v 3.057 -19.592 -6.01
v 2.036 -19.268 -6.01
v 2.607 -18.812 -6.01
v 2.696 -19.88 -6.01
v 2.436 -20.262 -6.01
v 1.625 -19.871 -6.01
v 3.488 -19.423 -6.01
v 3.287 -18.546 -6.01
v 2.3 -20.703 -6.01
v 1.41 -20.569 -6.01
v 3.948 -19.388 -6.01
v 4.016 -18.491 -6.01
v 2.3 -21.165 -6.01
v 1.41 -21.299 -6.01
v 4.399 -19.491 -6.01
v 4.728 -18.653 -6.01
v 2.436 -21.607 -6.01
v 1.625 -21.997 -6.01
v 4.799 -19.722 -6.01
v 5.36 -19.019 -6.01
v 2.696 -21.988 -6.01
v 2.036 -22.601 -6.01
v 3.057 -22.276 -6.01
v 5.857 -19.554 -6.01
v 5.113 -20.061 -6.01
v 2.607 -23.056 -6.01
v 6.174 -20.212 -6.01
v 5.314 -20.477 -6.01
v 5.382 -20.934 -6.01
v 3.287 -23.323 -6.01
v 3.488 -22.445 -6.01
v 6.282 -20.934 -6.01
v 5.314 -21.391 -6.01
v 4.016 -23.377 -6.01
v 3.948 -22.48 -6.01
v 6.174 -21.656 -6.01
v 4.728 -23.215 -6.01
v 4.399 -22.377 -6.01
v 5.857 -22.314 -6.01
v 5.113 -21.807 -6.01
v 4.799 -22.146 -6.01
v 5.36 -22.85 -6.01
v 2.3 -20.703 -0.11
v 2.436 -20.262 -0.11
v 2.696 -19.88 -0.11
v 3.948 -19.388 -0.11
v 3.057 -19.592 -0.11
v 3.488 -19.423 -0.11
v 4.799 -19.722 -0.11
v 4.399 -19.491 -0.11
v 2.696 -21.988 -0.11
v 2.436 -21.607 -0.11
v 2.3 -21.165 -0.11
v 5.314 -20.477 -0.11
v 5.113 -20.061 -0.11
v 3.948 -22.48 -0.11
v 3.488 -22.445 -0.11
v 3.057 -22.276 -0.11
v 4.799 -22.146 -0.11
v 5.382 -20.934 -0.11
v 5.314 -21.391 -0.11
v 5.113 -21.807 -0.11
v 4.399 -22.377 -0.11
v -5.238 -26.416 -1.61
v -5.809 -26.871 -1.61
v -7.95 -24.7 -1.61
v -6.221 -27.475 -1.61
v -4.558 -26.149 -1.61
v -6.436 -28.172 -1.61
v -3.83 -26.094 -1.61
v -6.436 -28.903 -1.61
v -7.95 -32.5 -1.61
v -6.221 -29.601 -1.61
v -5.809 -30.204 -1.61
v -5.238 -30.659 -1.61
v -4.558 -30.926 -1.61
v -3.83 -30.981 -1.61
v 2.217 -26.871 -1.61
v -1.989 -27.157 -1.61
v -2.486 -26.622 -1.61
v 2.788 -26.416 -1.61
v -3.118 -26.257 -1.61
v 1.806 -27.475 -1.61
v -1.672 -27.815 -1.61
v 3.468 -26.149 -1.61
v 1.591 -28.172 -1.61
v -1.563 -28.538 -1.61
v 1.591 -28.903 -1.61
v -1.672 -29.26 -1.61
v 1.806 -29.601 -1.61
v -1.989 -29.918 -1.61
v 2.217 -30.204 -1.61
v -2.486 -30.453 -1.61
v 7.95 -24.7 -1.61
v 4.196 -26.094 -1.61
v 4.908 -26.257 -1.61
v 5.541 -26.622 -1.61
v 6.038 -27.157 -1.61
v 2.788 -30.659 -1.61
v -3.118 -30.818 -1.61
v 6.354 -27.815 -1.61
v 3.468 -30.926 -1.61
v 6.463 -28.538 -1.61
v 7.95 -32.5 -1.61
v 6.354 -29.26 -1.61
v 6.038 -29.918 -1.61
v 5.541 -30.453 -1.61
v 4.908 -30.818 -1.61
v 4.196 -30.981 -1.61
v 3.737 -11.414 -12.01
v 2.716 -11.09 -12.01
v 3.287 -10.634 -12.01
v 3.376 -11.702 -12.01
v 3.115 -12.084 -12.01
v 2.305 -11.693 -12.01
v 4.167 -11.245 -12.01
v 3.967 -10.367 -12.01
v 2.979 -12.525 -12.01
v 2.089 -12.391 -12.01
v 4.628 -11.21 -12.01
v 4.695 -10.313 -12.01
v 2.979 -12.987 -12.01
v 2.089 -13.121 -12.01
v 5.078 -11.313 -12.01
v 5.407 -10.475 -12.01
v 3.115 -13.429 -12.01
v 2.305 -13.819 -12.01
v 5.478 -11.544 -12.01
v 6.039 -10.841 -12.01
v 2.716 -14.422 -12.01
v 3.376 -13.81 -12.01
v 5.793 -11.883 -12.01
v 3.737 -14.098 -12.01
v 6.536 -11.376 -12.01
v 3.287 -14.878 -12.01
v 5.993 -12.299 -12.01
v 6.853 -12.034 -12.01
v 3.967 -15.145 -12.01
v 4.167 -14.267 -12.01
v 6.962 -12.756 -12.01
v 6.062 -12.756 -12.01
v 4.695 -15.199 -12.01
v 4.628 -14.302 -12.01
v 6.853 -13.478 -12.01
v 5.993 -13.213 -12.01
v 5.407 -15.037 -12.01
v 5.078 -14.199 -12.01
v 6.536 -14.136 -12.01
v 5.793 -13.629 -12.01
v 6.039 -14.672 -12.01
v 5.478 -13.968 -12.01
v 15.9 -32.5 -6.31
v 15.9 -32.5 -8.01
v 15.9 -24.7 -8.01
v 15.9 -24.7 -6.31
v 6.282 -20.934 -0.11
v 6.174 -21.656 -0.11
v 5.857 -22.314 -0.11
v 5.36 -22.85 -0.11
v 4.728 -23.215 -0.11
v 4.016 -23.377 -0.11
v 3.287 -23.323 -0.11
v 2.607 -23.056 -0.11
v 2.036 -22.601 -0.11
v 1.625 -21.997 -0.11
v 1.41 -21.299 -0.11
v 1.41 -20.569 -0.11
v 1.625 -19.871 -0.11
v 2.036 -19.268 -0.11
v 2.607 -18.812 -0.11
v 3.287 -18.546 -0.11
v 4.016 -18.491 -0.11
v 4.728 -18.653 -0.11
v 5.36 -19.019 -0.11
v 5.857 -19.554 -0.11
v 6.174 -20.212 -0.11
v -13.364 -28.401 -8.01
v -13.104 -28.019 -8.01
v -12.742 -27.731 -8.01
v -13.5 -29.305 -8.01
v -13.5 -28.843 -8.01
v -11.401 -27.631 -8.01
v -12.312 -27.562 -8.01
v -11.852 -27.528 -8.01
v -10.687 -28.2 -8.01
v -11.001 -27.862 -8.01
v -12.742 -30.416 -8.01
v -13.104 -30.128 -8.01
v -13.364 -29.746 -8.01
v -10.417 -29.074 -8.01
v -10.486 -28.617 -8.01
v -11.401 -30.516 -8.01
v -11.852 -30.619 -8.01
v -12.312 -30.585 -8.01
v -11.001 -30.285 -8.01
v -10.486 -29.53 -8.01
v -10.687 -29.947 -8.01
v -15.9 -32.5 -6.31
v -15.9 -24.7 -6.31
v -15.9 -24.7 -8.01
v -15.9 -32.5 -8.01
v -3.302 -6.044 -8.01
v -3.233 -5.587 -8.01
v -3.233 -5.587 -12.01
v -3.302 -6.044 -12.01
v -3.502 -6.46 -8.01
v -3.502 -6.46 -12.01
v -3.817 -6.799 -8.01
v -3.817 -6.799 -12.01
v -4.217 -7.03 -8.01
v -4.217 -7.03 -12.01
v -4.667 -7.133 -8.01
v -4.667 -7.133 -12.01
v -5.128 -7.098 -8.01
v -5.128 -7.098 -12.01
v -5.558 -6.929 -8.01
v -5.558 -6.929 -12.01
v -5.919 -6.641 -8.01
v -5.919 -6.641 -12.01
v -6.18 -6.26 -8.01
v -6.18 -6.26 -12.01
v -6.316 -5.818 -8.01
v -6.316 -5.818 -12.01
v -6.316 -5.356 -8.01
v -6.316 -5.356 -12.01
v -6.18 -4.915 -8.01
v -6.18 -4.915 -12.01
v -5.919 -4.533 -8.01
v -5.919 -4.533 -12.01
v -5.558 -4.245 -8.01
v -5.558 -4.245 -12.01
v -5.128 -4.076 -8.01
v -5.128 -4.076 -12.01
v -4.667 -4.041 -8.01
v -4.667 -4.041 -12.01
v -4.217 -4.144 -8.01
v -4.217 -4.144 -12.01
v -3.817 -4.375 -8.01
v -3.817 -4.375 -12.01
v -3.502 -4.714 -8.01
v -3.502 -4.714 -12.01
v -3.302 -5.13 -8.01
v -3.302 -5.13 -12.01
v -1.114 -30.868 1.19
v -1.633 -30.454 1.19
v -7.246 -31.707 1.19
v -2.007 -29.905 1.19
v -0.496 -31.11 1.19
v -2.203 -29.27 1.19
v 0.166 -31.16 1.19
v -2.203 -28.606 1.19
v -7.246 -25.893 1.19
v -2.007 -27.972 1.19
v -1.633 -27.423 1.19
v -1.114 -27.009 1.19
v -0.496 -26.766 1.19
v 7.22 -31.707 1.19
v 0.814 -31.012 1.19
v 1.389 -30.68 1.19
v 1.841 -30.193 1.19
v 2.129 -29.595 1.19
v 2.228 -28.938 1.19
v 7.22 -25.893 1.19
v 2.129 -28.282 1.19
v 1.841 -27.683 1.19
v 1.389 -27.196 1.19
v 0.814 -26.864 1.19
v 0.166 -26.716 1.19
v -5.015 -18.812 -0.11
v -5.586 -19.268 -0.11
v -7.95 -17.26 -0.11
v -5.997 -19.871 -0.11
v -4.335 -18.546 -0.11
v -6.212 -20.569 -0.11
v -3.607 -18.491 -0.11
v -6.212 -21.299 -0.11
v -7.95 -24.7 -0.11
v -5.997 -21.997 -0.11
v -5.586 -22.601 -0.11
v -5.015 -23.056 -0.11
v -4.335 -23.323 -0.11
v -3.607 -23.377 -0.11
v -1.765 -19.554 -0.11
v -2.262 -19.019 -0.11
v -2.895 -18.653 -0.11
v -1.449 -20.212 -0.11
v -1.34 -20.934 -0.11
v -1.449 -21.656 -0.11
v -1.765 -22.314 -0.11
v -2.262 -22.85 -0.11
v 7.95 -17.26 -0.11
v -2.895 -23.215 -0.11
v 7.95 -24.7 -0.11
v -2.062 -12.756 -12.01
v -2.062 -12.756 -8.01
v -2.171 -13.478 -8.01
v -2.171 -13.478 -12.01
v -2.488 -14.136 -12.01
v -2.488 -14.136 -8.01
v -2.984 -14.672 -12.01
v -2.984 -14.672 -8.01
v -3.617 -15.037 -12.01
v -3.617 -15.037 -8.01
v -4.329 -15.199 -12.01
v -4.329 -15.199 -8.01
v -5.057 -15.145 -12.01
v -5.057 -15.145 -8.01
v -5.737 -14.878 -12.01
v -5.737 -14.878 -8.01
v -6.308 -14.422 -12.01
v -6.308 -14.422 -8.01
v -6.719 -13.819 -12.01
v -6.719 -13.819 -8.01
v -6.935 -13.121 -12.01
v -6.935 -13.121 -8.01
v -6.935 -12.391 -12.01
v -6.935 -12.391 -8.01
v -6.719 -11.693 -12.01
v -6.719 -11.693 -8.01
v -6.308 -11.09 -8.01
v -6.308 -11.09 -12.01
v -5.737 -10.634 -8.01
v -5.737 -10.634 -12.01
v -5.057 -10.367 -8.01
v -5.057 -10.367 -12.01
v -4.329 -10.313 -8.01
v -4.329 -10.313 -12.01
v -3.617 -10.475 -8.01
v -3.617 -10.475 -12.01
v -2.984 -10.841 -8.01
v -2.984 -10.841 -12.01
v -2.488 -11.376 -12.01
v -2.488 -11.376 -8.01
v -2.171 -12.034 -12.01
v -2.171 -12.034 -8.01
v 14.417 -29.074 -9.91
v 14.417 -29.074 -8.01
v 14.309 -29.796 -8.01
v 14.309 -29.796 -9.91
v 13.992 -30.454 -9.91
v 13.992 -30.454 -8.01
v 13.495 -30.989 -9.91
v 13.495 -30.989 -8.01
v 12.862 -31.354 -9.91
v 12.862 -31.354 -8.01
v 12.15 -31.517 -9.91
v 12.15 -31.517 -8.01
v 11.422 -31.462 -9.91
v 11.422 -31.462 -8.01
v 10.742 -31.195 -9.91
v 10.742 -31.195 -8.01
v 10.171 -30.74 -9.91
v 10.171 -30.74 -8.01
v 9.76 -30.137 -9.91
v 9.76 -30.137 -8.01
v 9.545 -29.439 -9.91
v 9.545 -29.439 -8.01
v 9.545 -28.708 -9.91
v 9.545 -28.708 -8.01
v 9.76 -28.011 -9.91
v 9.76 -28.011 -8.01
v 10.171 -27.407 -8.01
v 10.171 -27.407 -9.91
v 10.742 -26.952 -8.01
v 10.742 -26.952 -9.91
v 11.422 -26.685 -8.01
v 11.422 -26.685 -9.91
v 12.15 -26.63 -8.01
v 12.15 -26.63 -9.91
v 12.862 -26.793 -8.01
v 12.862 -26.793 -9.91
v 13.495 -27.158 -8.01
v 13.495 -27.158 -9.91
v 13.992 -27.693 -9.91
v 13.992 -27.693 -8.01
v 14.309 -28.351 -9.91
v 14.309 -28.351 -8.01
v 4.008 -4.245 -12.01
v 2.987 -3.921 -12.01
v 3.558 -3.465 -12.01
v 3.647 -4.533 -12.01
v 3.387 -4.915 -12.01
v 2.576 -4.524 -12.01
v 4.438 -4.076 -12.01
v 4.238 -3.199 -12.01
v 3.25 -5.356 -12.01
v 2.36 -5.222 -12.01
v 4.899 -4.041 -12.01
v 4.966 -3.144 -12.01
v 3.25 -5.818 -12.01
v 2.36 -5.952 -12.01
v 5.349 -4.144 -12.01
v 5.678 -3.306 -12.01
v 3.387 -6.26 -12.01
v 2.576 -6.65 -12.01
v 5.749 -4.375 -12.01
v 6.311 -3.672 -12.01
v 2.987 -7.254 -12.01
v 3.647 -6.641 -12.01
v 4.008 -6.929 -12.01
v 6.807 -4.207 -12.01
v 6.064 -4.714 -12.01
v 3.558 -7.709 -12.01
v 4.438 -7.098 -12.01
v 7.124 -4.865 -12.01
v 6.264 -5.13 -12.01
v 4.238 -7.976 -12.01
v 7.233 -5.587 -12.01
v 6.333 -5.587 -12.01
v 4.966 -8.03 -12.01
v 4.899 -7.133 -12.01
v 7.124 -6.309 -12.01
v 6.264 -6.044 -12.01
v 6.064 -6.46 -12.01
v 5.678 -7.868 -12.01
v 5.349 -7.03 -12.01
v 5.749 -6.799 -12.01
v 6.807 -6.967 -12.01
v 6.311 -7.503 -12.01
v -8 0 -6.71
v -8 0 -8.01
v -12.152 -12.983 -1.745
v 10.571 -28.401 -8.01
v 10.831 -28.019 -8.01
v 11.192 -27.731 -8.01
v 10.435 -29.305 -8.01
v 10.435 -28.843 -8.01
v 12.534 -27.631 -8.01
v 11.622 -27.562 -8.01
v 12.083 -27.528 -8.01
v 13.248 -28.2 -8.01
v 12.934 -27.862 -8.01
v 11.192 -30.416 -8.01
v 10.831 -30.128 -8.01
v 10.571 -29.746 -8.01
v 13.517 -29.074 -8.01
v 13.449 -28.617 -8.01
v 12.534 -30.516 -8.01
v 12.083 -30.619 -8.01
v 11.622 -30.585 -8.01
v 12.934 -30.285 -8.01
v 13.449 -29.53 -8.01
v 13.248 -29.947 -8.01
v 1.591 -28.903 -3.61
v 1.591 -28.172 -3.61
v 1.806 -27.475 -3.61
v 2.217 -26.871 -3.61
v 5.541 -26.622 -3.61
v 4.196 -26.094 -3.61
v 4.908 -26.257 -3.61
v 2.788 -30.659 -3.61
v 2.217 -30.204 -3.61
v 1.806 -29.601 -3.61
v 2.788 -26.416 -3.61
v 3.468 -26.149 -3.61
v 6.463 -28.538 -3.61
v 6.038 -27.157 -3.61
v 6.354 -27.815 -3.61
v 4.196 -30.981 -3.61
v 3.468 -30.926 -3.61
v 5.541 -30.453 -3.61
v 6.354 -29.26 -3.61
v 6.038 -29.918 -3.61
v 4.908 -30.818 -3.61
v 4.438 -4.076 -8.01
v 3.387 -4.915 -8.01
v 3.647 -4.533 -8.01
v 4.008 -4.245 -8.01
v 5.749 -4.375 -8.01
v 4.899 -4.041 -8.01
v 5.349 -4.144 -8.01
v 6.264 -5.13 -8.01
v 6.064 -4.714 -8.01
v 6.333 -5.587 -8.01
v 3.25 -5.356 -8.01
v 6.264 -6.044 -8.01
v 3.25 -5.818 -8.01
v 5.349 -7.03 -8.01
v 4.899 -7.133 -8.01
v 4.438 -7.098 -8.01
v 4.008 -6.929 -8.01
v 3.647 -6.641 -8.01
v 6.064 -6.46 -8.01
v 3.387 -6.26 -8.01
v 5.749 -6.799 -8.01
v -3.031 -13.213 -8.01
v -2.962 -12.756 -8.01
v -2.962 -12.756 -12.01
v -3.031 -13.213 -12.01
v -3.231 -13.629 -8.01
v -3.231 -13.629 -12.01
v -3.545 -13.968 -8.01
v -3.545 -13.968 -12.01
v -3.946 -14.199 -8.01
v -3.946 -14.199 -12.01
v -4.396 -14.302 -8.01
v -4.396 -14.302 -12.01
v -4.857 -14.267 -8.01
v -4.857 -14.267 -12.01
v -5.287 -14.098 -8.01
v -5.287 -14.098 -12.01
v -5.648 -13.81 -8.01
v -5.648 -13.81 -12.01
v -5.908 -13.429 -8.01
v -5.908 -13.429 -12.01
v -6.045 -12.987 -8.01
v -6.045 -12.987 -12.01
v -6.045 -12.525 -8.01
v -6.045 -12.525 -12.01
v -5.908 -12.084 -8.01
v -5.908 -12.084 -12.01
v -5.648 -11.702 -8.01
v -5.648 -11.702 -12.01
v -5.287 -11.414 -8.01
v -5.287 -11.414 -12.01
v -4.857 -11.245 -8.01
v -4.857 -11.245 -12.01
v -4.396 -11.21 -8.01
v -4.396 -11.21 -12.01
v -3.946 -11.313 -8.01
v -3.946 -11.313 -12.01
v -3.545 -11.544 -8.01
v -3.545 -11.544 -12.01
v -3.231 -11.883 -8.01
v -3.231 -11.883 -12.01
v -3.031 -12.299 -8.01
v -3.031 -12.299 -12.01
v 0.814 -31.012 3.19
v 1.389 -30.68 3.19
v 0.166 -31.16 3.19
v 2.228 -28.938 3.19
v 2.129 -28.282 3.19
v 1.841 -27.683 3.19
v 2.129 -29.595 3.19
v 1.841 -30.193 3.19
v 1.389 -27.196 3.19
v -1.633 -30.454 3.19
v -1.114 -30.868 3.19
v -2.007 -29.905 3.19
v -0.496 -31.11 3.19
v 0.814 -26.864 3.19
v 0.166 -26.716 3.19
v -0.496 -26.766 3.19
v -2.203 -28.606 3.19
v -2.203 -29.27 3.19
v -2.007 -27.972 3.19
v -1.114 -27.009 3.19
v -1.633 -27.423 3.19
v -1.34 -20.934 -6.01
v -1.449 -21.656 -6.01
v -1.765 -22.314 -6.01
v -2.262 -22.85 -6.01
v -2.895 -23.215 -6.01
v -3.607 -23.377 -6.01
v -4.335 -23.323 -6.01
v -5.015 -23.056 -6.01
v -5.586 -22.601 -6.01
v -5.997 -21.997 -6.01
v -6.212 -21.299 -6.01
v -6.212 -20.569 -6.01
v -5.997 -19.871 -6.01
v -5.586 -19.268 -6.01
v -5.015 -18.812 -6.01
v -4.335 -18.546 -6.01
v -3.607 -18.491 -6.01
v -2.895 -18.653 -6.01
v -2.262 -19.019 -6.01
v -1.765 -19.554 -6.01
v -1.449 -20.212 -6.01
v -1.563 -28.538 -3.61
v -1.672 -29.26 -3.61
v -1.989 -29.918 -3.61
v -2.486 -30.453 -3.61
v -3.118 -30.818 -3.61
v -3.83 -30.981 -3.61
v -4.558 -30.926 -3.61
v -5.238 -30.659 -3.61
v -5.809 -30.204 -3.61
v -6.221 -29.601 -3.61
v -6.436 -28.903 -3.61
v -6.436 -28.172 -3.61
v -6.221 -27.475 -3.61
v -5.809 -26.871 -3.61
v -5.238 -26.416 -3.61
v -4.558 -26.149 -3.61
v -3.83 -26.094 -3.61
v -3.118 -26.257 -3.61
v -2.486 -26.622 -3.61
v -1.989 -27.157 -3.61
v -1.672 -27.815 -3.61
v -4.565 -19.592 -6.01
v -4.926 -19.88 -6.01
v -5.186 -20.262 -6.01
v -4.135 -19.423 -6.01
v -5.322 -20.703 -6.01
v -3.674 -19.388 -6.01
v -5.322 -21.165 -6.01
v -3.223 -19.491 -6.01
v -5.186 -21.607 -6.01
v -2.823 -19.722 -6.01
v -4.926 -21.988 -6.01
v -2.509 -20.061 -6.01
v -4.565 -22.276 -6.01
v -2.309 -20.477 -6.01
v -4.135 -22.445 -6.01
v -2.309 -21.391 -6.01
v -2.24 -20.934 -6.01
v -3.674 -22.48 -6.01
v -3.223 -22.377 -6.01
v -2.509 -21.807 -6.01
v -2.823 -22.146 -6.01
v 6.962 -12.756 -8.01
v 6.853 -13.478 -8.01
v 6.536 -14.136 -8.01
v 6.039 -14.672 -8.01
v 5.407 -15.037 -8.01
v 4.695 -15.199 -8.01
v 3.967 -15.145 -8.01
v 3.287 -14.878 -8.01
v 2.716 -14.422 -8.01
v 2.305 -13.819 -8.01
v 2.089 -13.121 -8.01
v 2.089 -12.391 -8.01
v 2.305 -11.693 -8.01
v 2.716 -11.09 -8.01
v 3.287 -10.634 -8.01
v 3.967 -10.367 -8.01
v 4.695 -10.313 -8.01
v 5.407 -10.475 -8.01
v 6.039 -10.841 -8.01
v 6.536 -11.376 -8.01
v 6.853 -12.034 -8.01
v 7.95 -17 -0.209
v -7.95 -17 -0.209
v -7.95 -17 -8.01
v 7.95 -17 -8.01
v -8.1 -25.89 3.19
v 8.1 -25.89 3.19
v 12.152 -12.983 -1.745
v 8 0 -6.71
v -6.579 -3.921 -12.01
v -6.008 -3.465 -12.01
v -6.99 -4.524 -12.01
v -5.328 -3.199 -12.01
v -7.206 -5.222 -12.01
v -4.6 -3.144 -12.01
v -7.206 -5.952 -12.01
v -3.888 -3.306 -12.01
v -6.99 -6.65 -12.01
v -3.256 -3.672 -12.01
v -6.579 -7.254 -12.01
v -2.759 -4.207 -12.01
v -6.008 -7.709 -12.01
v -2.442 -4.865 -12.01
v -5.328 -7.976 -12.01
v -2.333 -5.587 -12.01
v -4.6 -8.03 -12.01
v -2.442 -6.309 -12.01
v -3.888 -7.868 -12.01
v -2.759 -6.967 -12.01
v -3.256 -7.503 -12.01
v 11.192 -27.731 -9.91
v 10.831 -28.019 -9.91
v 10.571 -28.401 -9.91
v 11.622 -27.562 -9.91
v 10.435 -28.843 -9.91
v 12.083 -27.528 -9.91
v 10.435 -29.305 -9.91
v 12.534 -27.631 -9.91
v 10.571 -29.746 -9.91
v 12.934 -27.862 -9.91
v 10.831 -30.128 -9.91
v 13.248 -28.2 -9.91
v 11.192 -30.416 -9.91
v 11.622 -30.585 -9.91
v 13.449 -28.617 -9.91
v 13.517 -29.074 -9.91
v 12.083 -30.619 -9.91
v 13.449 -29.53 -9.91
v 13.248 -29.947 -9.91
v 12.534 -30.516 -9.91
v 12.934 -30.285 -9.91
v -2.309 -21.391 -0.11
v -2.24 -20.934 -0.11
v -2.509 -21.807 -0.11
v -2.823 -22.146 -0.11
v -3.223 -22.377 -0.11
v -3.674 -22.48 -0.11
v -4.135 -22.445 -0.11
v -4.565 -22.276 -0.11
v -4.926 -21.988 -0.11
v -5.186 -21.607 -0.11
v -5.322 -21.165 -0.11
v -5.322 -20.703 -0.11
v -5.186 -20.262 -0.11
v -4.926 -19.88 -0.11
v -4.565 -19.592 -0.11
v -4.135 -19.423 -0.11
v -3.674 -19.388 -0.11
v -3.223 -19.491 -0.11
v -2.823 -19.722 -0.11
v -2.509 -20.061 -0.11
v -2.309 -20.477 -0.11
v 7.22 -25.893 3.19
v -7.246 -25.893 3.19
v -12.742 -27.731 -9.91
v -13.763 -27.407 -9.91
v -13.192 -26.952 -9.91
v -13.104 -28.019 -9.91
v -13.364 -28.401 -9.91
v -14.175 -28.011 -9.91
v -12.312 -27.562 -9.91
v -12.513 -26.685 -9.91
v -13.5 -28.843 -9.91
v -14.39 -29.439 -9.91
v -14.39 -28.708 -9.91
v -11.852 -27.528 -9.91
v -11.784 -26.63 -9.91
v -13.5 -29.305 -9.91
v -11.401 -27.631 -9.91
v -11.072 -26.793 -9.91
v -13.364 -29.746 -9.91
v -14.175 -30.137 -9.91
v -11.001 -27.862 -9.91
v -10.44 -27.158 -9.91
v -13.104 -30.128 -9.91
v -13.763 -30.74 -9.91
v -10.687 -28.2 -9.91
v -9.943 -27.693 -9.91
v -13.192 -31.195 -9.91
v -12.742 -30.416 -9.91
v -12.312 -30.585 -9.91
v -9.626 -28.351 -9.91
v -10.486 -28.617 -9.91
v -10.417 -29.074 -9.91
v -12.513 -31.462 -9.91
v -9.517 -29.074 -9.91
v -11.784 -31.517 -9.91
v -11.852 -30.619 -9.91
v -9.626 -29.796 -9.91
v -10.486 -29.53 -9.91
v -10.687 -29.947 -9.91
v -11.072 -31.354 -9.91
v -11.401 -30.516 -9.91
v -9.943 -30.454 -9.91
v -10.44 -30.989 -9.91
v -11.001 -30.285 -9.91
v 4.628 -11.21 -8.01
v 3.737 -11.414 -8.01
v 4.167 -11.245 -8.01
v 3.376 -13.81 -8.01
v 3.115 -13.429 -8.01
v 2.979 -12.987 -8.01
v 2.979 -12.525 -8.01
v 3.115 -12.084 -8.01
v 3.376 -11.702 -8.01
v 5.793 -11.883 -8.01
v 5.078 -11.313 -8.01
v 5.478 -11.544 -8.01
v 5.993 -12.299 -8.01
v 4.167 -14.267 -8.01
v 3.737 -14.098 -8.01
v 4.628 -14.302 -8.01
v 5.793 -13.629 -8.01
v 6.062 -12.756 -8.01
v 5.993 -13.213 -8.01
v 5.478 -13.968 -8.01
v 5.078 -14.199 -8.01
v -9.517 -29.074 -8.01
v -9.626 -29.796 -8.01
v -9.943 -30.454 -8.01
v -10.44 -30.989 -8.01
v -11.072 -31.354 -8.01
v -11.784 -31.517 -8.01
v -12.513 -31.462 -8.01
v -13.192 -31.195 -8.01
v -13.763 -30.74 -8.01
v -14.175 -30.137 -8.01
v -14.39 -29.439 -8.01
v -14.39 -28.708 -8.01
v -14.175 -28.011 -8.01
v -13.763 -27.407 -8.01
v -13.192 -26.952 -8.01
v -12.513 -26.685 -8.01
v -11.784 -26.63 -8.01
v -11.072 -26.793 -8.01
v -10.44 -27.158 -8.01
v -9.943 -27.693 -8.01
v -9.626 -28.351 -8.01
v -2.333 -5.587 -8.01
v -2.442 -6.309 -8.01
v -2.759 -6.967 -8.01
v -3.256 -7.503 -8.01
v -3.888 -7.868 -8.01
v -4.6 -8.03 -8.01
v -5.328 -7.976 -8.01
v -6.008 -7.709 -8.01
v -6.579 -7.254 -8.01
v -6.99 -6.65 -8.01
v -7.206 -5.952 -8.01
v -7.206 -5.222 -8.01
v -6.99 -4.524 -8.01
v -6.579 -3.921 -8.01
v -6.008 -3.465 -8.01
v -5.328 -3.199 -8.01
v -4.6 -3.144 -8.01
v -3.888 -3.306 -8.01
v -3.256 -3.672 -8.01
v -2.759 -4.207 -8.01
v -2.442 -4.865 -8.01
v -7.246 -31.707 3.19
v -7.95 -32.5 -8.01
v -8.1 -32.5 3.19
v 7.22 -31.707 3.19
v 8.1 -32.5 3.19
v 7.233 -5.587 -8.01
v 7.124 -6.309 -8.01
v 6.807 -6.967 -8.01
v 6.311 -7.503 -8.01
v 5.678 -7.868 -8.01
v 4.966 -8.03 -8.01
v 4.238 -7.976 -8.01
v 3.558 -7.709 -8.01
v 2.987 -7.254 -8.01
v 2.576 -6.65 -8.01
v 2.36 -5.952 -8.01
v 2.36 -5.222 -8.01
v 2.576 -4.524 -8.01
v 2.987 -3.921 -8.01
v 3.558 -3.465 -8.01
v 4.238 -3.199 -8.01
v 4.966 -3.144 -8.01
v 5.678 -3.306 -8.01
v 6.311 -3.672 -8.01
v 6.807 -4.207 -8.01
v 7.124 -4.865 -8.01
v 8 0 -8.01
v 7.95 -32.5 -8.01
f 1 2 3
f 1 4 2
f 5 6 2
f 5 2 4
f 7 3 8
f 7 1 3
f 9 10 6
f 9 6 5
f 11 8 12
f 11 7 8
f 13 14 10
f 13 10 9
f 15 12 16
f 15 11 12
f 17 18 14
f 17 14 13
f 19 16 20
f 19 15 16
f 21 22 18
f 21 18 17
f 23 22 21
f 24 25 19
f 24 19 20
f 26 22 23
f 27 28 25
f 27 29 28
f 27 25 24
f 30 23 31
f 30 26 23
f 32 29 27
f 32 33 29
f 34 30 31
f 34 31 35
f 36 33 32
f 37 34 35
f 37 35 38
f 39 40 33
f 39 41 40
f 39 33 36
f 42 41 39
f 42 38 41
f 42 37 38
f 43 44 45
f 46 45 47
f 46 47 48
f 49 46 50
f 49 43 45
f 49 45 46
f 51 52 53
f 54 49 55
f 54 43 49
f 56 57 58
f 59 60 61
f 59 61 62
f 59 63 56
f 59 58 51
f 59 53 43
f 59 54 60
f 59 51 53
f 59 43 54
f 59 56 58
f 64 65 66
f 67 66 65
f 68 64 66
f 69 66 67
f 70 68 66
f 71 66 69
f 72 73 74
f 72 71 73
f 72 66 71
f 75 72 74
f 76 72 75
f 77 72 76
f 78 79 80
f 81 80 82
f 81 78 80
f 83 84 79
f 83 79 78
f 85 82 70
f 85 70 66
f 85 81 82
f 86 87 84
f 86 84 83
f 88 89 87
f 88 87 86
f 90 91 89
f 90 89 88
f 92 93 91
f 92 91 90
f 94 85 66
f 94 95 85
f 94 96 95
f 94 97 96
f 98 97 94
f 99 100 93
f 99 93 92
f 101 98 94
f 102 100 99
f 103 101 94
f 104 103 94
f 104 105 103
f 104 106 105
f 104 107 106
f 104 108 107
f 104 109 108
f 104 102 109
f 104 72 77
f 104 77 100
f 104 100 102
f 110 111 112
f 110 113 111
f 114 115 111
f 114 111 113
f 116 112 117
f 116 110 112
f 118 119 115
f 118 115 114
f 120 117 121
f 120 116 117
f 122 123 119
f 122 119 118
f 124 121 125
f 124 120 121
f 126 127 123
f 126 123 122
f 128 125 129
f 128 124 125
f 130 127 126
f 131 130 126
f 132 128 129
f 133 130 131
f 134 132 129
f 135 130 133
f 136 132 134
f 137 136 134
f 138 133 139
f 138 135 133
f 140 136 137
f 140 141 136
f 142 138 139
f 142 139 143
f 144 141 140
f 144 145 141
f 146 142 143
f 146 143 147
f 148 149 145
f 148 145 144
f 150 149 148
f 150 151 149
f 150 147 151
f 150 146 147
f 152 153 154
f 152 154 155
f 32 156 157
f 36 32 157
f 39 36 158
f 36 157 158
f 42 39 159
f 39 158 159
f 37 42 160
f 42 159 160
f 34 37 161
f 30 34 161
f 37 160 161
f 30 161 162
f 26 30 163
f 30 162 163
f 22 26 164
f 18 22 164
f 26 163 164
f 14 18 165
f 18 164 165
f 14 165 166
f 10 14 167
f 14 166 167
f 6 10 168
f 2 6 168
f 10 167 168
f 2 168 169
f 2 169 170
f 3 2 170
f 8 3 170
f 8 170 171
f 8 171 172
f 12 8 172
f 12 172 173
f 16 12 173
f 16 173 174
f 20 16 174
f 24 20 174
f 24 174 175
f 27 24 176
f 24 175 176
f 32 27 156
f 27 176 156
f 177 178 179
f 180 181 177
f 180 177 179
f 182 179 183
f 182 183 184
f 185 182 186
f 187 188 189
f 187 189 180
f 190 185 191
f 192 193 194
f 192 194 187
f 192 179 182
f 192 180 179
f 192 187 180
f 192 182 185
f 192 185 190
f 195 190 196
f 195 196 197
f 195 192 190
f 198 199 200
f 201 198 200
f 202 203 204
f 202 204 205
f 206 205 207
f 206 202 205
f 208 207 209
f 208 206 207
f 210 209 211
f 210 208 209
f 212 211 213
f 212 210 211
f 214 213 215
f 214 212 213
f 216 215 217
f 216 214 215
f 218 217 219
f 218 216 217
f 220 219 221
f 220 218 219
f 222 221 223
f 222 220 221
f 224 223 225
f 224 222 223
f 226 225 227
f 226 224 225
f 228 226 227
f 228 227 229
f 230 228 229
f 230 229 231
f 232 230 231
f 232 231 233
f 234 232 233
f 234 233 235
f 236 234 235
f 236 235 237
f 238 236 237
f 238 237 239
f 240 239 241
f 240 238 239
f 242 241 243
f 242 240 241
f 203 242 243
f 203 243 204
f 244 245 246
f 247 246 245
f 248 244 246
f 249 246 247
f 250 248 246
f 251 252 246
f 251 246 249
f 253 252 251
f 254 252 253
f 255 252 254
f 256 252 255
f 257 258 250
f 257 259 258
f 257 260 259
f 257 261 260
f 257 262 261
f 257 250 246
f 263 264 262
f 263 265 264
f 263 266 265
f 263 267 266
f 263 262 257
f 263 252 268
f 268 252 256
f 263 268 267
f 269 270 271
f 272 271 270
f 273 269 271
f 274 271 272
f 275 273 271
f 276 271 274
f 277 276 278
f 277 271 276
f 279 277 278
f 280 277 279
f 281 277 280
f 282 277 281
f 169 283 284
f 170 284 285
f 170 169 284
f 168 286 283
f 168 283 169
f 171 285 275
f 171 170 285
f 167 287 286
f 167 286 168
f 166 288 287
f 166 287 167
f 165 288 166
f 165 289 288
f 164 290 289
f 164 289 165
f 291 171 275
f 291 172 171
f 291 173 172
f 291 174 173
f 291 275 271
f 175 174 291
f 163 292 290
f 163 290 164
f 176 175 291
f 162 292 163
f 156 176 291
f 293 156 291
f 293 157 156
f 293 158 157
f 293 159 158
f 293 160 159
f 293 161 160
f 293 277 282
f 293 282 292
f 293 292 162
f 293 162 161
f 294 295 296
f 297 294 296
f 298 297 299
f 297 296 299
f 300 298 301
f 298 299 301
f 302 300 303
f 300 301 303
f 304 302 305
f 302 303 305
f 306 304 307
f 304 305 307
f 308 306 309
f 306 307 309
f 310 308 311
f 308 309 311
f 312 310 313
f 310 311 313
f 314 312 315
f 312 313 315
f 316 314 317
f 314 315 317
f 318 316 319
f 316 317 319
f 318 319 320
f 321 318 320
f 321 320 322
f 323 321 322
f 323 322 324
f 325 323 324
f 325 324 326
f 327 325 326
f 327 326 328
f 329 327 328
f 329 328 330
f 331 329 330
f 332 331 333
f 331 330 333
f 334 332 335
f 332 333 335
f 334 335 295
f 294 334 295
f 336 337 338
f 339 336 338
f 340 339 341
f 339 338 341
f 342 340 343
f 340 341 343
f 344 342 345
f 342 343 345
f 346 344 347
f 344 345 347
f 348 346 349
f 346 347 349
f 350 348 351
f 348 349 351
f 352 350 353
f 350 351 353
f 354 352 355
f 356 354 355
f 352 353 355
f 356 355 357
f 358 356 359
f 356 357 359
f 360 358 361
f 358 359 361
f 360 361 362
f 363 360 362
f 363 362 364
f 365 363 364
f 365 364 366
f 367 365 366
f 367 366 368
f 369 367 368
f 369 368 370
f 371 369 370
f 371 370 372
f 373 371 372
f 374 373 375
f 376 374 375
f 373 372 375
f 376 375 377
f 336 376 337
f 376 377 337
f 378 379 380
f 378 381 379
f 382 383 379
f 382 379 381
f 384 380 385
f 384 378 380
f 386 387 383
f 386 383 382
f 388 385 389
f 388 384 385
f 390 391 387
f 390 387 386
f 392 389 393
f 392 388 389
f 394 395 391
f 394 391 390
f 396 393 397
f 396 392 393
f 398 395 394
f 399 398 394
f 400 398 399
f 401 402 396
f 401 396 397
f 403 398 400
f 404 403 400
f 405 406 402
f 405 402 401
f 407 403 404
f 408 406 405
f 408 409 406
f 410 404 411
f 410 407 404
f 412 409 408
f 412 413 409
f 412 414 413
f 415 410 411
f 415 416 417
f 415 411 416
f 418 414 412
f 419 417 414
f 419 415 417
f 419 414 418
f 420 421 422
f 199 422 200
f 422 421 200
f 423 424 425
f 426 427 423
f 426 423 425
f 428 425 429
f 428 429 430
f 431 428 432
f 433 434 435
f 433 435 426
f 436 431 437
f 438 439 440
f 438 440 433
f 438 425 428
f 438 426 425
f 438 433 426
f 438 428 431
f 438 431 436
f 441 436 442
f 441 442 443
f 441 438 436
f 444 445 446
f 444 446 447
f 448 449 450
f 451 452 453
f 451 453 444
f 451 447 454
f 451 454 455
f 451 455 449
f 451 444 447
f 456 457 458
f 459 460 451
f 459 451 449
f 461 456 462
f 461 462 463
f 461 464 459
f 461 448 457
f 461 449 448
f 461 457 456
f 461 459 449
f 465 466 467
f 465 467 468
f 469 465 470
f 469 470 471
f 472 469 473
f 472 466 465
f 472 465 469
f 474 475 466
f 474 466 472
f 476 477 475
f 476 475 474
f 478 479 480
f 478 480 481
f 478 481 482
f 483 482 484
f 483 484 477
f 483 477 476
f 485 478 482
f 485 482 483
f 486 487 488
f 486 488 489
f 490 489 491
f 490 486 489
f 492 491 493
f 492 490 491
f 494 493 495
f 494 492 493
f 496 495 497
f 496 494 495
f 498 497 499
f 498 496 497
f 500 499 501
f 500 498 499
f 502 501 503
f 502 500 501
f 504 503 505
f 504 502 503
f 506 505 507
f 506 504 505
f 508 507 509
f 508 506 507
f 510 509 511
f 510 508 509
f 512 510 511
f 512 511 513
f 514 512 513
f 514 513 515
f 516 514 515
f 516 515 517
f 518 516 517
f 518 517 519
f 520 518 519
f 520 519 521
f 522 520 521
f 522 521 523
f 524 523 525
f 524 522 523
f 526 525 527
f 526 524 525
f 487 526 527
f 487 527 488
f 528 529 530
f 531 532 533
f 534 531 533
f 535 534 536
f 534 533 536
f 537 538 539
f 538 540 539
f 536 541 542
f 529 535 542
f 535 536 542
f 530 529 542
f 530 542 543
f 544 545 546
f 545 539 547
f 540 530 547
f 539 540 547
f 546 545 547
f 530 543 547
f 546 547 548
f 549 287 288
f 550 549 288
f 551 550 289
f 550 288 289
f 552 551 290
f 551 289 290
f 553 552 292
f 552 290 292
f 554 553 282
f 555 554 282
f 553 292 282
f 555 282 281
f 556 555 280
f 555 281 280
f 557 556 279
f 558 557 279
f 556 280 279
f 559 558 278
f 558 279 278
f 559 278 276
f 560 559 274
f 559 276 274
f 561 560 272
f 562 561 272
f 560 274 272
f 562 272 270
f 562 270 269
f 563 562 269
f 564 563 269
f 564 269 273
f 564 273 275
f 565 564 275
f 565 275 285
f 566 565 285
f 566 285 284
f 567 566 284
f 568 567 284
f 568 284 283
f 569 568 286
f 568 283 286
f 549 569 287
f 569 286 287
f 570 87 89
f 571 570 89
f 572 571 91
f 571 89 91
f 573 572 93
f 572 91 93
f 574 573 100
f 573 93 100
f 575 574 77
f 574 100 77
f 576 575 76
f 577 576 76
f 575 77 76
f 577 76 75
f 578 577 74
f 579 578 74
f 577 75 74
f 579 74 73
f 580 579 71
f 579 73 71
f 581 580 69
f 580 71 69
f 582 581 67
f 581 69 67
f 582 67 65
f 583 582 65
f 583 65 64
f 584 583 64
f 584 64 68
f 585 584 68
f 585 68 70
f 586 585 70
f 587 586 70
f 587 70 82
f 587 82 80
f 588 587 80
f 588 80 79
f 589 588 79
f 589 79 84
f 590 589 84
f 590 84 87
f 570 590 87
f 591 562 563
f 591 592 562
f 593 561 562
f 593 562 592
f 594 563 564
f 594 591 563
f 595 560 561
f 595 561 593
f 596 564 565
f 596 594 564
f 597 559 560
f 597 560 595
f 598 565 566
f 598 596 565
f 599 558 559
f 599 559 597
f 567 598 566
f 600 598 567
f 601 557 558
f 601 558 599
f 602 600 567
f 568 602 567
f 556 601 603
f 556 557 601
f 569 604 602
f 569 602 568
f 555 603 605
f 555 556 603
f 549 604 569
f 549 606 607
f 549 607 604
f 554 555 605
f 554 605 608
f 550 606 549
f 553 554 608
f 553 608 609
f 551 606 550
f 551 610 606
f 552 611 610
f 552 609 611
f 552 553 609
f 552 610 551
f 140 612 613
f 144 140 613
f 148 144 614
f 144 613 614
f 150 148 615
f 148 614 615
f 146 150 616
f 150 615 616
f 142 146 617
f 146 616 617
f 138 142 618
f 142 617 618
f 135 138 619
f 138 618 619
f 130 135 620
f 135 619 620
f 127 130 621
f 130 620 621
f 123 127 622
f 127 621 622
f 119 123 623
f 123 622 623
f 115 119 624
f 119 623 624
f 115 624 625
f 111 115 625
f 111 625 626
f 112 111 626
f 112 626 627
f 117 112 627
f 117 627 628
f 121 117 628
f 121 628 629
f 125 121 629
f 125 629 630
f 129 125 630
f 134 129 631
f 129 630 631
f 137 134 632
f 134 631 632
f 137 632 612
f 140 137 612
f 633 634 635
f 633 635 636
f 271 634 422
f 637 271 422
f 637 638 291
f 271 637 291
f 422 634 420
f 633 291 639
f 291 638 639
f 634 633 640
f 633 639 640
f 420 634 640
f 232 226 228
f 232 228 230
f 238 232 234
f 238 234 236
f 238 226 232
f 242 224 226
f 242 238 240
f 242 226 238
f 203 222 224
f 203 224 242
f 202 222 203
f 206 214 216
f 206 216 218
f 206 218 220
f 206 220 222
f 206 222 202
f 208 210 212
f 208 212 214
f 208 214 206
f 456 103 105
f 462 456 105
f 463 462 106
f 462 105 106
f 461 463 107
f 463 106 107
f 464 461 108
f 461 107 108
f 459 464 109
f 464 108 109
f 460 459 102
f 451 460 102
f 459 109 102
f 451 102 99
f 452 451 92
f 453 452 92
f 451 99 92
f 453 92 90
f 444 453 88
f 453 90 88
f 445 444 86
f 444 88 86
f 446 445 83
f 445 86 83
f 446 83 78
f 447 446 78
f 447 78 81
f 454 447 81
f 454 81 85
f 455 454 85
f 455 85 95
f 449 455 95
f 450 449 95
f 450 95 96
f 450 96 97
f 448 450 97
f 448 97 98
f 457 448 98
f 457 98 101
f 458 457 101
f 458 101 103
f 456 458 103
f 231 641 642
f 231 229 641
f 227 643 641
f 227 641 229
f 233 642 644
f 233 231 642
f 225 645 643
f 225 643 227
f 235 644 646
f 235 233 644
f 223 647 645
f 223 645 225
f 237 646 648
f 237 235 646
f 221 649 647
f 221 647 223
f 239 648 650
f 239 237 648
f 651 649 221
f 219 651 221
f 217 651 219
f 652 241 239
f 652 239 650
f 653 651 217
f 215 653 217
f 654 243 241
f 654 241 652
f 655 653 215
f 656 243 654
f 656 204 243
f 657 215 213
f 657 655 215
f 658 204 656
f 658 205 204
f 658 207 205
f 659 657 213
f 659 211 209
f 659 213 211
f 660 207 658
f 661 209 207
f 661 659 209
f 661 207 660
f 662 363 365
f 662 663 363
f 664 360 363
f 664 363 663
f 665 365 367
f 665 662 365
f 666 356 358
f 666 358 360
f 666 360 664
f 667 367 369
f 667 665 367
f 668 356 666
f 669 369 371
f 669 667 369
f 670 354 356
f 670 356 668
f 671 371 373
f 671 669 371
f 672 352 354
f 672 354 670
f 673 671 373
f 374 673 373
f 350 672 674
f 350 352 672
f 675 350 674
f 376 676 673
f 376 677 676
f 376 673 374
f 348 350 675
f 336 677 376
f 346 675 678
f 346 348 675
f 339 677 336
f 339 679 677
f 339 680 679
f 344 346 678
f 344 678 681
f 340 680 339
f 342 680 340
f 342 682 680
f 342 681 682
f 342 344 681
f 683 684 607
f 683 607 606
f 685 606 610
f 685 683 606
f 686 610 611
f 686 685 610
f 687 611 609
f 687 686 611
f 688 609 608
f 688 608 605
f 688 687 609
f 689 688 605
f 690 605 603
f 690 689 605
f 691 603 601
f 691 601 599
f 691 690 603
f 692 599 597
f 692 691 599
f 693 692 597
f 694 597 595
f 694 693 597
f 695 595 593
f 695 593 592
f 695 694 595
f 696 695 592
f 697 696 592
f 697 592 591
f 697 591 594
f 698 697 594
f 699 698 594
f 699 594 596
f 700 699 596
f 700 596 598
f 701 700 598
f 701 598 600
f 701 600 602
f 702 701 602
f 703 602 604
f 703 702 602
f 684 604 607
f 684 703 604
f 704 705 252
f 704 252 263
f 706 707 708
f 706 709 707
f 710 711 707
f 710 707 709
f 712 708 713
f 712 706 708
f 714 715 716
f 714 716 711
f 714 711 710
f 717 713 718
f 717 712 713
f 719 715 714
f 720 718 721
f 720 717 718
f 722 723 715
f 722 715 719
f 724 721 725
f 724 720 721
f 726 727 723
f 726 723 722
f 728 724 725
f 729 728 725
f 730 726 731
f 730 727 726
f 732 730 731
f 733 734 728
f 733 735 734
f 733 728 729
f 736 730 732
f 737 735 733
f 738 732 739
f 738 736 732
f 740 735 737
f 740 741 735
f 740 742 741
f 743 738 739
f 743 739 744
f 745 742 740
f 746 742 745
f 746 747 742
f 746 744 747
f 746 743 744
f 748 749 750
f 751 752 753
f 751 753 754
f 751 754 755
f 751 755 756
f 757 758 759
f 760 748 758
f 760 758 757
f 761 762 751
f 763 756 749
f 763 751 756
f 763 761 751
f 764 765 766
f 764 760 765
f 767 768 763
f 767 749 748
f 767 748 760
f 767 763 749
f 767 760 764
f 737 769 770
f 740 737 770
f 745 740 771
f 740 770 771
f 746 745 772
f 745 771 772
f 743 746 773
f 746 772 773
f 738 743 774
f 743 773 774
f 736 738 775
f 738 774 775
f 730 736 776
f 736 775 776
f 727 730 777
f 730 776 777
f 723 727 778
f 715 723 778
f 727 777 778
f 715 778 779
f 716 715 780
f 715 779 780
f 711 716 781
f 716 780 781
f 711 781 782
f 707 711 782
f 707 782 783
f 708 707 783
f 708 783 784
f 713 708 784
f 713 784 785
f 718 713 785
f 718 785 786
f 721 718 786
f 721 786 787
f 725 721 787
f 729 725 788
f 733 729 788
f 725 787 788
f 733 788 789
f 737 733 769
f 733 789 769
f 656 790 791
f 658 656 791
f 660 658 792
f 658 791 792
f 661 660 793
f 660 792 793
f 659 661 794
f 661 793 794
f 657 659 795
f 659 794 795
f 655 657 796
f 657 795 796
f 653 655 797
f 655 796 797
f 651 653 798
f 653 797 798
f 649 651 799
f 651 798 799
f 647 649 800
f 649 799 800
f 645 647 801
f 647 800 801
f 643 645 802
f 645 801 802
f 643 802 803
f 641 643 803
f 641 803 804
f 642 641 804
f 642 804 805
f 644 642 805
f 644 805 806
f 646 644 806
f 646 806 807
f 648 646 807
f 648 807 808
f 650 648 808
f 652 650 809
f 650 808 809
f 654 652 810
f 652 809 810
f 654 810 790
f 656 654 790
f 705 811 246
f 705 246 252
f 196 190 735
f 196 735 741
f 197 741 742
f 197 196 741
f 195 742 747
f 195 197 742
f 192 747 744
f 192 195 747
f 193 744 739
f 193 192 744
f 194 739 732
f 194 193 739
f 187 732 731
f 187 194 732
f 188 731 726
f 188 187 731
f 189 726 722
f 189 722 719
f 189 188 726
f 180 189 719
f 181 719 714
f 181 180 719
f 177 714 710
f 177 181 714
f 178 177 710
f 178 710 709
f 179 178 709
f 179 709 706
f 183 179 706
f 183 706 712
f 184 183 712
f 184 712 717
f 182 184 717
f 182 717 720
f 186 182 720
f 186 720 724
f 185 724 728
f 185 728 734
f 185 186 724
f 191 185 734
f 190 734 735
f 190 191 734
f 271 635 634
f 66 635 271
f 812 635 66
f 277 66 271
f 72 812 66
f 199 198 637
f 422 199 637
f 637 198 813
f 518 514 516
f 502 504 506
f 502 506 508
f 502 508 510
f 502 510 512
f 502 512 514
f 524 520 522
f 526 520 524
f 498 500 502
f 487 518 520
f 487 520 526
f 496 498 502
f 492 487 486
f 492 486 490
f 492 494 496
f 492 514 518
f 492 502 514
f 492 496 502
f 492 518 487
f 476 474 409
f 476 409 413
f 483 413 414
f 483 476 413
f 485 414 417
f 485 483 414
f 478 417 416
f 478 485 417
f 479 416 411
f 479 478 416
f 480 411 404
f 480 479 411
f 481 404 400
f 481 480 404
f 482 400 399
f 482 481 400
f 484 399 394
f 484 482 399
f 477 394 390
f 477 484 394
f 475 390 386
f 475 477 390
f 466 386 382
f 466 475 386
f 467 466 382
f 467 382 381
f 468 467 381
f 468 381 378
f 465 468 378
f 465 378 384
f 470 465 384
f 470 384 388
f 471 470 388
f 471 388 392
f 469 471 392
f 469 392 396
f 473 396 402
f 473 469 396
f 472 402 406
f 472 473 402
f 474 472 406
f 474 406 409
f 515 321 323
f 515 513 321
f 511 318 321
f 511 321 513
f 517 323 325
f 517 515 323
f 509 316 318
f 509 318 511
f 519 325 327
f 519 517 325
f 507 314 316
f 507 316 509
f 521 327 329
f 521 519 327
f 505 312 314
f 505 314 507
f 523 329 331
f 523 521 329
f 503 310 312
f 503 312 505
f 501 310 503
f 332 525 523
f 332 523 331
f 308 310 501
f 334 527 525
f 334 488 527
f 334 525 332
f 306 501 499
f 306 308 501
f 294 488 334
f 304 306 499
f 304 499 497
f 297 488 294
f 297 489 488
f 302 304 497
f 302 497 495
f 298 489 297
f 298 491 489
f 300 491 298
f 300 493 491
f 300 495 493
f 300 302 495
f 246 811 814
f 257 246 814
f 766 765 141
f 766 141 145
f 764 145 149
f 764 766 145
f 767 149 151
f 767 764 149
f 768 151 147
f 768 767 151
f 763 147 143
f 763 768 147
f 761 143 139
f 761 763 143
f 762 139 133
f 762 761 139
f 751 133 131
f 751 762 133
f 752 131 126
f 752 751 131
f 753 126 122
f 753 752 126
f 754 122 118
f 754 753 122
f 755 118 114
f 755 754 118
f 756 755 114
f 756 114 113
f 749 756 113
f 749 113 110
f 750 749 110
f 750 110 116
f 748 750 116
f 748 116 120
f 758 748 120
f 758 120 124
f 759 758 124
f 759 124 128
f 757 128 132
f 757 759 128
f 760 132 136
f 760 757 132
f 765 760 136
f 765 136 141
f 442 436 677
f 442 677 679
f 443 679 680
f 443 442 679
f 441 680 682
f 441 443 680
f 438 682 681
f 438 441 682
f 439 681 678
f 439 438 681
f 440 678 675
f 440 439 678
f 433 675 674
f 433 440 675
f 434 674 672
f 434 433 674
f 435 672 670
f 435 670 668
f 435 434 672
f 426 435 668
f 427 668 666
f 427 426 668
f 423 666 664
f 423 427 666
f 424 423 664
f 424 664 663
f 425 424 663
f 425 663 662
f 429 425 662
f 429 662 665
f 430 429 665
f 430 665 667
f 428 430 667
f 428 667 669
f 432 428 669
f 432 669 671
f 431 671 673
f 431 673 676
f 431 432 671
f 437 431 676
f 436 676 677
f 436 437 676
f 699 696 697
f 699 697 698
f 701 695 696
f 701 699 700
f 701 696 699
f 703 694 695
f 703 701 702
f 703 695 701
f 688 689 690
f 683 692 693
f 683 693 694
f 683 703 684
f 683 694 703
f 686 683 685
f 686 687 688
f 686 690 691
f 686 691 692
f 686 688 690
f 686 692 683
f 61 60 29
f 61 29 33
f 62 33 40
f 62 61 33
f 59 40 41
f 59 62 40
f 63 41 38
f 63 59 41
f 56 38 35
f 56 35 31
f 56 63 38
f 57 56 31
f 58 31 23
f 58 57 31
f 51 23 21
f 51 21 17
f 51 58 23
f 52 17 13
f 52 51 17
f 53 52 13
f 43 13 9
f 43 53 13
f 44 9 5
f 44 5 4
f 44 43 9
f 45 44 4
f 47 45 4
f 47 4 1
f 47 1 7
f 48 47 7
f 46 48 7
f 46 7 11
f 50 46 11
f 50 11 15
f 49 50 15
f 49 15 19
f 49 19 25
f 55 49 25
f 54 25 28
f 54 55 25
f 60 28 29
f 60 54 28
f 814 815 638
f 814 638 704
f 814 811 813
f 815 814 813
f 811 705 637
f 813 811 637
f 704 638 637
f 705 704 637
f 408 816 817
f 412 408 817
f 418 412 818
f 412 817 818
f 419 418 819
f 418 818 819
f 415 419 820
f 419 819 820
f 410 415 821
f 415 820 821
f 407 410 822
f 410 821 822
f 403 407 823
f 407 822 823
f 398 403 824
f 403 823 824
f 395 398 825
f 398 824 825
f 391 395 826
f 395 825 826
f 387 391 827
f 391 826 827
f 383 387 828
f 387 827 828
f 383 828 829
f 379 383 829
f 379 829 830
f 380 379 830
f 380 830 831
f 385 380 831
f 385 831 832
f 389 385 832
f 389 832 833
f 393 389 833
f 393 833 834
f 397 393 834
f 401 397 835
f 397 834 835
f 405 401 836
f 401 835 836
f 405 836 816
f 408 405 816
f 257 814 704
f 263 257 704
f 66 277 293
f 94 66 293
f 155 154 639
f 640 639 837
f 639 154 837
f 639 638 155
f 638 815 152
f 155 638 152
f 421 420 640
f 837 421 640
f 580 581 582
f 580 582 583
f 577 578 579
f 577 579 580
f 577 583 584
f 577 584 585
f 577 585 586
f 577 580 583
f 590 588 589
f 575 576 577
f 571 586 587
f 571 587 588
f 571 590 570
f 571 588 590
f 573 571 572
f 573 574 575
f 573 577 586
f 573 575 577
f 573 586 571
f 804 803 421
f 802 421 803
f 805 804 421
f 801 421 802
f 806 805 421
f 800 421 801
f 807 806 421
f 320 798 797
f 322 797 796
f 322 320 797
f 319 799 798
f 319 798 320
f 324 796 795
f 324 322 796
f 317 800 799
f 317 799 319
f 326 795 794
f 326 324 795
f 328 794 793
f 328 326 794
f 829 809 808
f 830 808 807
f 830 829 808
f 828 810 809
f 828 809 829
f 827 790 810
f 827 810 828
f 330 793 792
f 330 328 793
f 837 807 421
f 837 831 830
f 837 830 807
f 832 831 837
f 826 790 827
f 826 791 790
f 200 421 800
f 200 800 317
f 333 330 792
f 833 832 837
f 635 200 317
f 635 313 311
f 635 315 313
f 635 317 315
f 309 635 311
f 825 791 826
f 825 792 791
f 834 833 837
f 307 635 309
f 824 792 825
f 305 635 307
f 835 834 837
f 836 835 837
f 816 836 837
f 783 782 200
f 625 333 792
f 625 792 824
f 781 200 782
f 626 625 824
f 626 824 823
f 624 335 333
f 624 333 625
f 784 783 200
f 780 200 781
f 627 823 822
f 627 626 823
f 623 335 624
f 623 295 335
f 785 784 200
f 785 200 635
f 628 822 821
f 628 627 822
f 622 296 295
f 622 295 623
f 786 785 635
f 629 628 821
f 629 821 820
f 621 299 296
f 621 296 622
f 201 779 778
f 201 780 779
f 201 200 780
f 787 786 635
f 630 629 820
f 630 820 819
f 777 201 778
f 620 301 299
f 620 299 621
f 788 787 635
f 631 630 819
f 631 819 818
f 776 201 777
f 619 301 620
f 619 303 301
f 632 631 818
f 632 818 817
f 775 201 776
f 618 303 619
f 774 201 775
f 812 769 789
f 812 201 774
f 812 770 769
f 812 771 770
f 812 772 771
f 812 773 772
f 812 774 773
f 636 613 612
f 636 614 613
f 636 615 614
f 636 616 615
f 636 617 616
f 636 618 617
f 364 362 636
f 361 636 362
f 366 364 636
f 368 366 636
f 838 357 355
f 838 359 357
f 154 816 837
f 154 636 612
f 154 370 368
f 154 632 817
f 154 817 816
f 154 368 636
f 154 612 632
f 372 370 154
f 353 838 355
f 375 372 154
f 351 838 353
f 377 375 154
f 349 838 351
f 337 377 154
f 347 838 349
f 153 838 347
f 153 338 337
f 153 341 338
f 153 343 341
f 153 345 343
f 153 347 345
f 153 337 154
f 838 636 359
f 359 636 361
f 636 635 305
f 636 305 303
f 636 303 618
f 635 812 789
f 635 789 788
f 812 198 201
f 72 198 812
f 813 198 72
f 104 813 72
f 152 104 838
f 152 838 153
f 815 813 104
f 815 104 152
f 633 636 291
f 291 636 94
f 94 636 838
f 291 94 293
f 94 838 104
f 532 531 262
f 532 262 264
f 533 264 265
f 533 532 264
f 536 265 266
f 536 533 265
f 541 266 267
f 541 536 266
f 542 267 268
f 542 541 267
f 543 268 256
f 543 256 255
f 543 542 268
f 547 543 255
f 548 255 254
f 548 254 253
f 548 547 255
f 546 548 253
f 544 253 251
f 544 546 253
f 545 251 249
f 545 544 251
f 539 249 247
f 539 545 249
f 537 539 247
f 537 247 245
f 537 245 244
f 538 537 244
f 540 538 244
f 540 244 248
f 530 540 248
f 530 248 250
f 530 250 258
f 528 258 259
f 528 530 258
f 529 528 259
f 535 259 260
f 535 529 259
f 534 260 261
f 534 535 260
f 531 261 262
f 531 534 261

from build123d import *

# Parameters (mm, degrees)
F0_W      = 15.96
F0_H      = 8.3576925244
F1_DEPTH  = 32.5
F2_W      = 15.9
F2_H      = 6.4
F3_DEPTH  = 15.5
F4_DEPTH  = 70
F6_DEPTH  = 25
F7_R      = 2.45
F8_DEPTH  = 2
F7_W      = 15.9
F7_H      = 7.8
F8_FACE_R = 2.45
F9_DEPTH  = 1.5
F10_R     = 2.45
F10_R_2   = 1.55
F11_DEPTH = 5.9
F12_R     = 2.45
F12_R_2   = 1.55
F13_DEPTH = 1.9
F14_DEPTH = 4
F15_DEPTH = 4
F16_W     = 14.4657706842
F16_H     = 5.8139935136
F16_R     = 2.228006958
F17_DEPTH = 2
F19_DEPTH = 12.5


with BuildPart() as f1:
    # F0 (on Front) → F1 (new body)
    with BuildSketch(Plane.XZ):
        Polygon((15.9, 3.1903535793), (-15.9, 3.1903535793), (-15.9, -6.5096464207), (-6.726923441, -6.5096464207), (-6.726923441, 1.8480461037), (9.233076559, 1.8480461037), (9.233076559, -6.5096464207), (15.9, -6.5096464207), align=None)
        with Locations((1.253076559, -2.3308001585)):
            Rectangle(F0_W, F0_H)
    extrude(amount=F1_DEPTH)

    # F2 (on face) → F3 (cut)
    with BuildSketch(Plane.XZ.offset(32.5)):
        with Locations((0, -3.3096464207)):
            Rectangle(F2_W, F2_H)
    extrude(amount=-F3_DEPTH, mode=Mode.SUBTRACT)

    # F2 (on face) → F4 (cut)
    with BuildSketch(Plane.XZ.offset(32.5)):
        Polygon((-15.9, 3.1903535793), (-15.9, -6.3096464207), (-8.1, 3.1903535793), align=None)
        Polygon((8.1, 3.1903535793), (15.9, -6.3096464207), (15.9, 3.1903535793), align=None)
    extrude(amount=-F4_DEPTH, mode=Mode.SUBTRACT)

    # F5 (on face) → F6 (cut)
    with BuildSketch(Plane(origin=(0, 0, -6.5096464207), x_dir=(1, 0, 0), z_dir=(0, 0, -1))):
        Polygon((-8, 0), (-15.9, 24.7), (-15.9, 0), align=None)
        Polygon((15.9, 24.7), (8, 0), (15.9, 0), align=None)
    extrude(amount=-F6_DEPTH, mode=Mode.SUBTRACT)

    # F7 (on face) → F8 (join)
    with BuildSketch(Plane(origin=(0, 0, -0.1096464207), x_dir=(1, 0, 0), z_dir=(0, 0, -1))):
        with Locations((-4.0132352151, 28.5375677049)):
            Circle(F7_R)
        with Locations((4.0132352151, 28.5375677049)):
            Circle(F7_R)
    extrude(amount=F8_DEPTH)

    # F7 (on face) + F1_face1 (on face) + F8_face (on face) → F9 (join)
    with BuildSketch(Plane(origin=(0, 0, -0.1096464207), x_dir=(1, 0, 0), z_dir=(0, 0, -1))):
        with Locations((0, 28.6)):
            Rectangle(F7_W, F7_H)
        with Locations((-4.0132352151, 28.5375677049)):
            Circle(F7_R, mode=Mode.SUBTRACT)
        with Locations((4.0132352151, 28.5375677049)):
            Circle(F7_R, mode=Mode.SUBTRACT)
    with BuildSketch(Plane(origin=(0, -13.5883838384, -6.5096464207), x_dir=(1, 0, 0), z_dir=(0, 0, -1))):
        Polygon((-8, -13.5883838384), (8, -13.5883838384), (15.9, 11.1116161616), (15.9, 18.9116161616), (7.95, 18.9116161616), (7.95, 3.4116161616), (-7.95, 3.4116161616), (-7.95, 18.9116161616), (-15.9, 18.9116161616), (-15.9, 11.1116161616), align=None)
    with BuildSketch(Plane(origin=(-4.0132352151, -28.5375677049, -2.1096464207), x_dir=(1, 0, 0), z_dir=(0, 0, -1))):
        Circle(F8_FACE_R)
        with Locations((8.0264704302, 0)):
            Circle(F8_FACE_R)
    extrude(amount=F9_DEPTH)

    # F10 (on face) → F11 (join)
    with BuildSketch(Plane(origin=(0, 0, -0.1096464207), x_dir=(1, 0, 0), z_dir=(0, 0, -1))):
        with Locations((-3.7897760311, 20.9340956062)):
            Circle(F10_R)
        with Locations((-3.7897760311, 20.9340956062)):
            Circle(F10_R_2, mode=Mode.SUBTRACT)
        with Locations((3.8324711446, 20.9340956062)):
            Circle(F10_R)
        with Locations((3.8324711446, 20.9340956062)):
            Circle(F10_R_2, mode=Mode.SUBTRACT)
    extrude(amount=F11_DEPTH)

    # F12 (on face) → F13 (join)
    with BuildSketch(Plane(origin=(0, 0, -8.0096464207), x_dir=(1, 0, 0), z_dir=(0, 0, -1))):
        with Locations((-11.9673879817, 29.0735326707)):
            Circle(F12_R)
        with Locations((-11.9673879817, 29.0735326707)):
            Circle(F12_R_2, mode=Mode.SUBTRACT)
        with Locations((11.9673879817, 29.0735326707)):
            Circle(F12_R)
        with Locations((11.9673879817, 29.0735326707)):
            Circle(F12_R_2, mode=Mode.SUBTRACT)
    extrude(amount=F13_DEPTH)

    # F12 (on face) → F14 (join)
    with BuildSketch(Plane(origin=(0, 0, -8.0096464207), x_dir=(1, 0, 0), z_dir=(0, 0, -1))):
        with Locations((-4.5118764974, 12.756055221)):
            Circle(F12_R)
        with Locations((-4.5118764974, 12.756055221)):
            Circle(F12_R_2, mode=Mode.SUBTRACT)
        with Locations((4.5118764974, 12.756055221)):
            Circle(F12_R)
        with Locations((4.5118764974, 12.756055221)):
            Circle(F12_R_2, mode=Mode.SUBTRACT)
    extrude(amount=F14_DEPTH)

    # F12 (on face) → F15 (join)
    with BuildSketch(Plane(origin=(0, 0, -8.0096464207), x_dir=(1, 0, 0), z_dir=(0, 0, -1))):
        with Locations((-4.7830846161, 5.5871135555)):
            Circle(F12_R)
        with Locations((-4.7830846161, 5.5871135555)):
            Circle(F12_R_2, mode=Mode.SUBTRACT)
        with Locations((4.7830846161, 5.5871135555)):
            Circle(F12_R)
        with Locations((4.7830846161, 5.5871135555)):
            Circle(F12_R_2, mode=Mode.SUBTRACT)
    extrude(amount=F15_DEPTH)

    # F16 (on face) → F17 (cut)
    with BuildSketch(Plane.XY.offset(3.1903535793)):
        with Locations((-0.0129453838, -28.7997983396)):
            Rectangle(F16_W, F16_H)
        with Locations((0, -28.9382264018)):
            Circle(F16_R, mode=Mode.SUBTRACT)
    extrude(amount=-F17_DEPTH, mode=Mode.SUBTRACT)

    # F18 (on Right) → F19 (cut, symmetric)
    with BuildSketch(Plane.YZ):
        Polygon((-25.8897673339, 3.1903535793), (0, -6.7096464207), (0, 3.1903535793), (-0.3126582278, 3.1903535793), align=None)
    extrude(amount=F19_DEPTH, both=True, mode=Mode.SUBTRACT)


solid = f1.part
